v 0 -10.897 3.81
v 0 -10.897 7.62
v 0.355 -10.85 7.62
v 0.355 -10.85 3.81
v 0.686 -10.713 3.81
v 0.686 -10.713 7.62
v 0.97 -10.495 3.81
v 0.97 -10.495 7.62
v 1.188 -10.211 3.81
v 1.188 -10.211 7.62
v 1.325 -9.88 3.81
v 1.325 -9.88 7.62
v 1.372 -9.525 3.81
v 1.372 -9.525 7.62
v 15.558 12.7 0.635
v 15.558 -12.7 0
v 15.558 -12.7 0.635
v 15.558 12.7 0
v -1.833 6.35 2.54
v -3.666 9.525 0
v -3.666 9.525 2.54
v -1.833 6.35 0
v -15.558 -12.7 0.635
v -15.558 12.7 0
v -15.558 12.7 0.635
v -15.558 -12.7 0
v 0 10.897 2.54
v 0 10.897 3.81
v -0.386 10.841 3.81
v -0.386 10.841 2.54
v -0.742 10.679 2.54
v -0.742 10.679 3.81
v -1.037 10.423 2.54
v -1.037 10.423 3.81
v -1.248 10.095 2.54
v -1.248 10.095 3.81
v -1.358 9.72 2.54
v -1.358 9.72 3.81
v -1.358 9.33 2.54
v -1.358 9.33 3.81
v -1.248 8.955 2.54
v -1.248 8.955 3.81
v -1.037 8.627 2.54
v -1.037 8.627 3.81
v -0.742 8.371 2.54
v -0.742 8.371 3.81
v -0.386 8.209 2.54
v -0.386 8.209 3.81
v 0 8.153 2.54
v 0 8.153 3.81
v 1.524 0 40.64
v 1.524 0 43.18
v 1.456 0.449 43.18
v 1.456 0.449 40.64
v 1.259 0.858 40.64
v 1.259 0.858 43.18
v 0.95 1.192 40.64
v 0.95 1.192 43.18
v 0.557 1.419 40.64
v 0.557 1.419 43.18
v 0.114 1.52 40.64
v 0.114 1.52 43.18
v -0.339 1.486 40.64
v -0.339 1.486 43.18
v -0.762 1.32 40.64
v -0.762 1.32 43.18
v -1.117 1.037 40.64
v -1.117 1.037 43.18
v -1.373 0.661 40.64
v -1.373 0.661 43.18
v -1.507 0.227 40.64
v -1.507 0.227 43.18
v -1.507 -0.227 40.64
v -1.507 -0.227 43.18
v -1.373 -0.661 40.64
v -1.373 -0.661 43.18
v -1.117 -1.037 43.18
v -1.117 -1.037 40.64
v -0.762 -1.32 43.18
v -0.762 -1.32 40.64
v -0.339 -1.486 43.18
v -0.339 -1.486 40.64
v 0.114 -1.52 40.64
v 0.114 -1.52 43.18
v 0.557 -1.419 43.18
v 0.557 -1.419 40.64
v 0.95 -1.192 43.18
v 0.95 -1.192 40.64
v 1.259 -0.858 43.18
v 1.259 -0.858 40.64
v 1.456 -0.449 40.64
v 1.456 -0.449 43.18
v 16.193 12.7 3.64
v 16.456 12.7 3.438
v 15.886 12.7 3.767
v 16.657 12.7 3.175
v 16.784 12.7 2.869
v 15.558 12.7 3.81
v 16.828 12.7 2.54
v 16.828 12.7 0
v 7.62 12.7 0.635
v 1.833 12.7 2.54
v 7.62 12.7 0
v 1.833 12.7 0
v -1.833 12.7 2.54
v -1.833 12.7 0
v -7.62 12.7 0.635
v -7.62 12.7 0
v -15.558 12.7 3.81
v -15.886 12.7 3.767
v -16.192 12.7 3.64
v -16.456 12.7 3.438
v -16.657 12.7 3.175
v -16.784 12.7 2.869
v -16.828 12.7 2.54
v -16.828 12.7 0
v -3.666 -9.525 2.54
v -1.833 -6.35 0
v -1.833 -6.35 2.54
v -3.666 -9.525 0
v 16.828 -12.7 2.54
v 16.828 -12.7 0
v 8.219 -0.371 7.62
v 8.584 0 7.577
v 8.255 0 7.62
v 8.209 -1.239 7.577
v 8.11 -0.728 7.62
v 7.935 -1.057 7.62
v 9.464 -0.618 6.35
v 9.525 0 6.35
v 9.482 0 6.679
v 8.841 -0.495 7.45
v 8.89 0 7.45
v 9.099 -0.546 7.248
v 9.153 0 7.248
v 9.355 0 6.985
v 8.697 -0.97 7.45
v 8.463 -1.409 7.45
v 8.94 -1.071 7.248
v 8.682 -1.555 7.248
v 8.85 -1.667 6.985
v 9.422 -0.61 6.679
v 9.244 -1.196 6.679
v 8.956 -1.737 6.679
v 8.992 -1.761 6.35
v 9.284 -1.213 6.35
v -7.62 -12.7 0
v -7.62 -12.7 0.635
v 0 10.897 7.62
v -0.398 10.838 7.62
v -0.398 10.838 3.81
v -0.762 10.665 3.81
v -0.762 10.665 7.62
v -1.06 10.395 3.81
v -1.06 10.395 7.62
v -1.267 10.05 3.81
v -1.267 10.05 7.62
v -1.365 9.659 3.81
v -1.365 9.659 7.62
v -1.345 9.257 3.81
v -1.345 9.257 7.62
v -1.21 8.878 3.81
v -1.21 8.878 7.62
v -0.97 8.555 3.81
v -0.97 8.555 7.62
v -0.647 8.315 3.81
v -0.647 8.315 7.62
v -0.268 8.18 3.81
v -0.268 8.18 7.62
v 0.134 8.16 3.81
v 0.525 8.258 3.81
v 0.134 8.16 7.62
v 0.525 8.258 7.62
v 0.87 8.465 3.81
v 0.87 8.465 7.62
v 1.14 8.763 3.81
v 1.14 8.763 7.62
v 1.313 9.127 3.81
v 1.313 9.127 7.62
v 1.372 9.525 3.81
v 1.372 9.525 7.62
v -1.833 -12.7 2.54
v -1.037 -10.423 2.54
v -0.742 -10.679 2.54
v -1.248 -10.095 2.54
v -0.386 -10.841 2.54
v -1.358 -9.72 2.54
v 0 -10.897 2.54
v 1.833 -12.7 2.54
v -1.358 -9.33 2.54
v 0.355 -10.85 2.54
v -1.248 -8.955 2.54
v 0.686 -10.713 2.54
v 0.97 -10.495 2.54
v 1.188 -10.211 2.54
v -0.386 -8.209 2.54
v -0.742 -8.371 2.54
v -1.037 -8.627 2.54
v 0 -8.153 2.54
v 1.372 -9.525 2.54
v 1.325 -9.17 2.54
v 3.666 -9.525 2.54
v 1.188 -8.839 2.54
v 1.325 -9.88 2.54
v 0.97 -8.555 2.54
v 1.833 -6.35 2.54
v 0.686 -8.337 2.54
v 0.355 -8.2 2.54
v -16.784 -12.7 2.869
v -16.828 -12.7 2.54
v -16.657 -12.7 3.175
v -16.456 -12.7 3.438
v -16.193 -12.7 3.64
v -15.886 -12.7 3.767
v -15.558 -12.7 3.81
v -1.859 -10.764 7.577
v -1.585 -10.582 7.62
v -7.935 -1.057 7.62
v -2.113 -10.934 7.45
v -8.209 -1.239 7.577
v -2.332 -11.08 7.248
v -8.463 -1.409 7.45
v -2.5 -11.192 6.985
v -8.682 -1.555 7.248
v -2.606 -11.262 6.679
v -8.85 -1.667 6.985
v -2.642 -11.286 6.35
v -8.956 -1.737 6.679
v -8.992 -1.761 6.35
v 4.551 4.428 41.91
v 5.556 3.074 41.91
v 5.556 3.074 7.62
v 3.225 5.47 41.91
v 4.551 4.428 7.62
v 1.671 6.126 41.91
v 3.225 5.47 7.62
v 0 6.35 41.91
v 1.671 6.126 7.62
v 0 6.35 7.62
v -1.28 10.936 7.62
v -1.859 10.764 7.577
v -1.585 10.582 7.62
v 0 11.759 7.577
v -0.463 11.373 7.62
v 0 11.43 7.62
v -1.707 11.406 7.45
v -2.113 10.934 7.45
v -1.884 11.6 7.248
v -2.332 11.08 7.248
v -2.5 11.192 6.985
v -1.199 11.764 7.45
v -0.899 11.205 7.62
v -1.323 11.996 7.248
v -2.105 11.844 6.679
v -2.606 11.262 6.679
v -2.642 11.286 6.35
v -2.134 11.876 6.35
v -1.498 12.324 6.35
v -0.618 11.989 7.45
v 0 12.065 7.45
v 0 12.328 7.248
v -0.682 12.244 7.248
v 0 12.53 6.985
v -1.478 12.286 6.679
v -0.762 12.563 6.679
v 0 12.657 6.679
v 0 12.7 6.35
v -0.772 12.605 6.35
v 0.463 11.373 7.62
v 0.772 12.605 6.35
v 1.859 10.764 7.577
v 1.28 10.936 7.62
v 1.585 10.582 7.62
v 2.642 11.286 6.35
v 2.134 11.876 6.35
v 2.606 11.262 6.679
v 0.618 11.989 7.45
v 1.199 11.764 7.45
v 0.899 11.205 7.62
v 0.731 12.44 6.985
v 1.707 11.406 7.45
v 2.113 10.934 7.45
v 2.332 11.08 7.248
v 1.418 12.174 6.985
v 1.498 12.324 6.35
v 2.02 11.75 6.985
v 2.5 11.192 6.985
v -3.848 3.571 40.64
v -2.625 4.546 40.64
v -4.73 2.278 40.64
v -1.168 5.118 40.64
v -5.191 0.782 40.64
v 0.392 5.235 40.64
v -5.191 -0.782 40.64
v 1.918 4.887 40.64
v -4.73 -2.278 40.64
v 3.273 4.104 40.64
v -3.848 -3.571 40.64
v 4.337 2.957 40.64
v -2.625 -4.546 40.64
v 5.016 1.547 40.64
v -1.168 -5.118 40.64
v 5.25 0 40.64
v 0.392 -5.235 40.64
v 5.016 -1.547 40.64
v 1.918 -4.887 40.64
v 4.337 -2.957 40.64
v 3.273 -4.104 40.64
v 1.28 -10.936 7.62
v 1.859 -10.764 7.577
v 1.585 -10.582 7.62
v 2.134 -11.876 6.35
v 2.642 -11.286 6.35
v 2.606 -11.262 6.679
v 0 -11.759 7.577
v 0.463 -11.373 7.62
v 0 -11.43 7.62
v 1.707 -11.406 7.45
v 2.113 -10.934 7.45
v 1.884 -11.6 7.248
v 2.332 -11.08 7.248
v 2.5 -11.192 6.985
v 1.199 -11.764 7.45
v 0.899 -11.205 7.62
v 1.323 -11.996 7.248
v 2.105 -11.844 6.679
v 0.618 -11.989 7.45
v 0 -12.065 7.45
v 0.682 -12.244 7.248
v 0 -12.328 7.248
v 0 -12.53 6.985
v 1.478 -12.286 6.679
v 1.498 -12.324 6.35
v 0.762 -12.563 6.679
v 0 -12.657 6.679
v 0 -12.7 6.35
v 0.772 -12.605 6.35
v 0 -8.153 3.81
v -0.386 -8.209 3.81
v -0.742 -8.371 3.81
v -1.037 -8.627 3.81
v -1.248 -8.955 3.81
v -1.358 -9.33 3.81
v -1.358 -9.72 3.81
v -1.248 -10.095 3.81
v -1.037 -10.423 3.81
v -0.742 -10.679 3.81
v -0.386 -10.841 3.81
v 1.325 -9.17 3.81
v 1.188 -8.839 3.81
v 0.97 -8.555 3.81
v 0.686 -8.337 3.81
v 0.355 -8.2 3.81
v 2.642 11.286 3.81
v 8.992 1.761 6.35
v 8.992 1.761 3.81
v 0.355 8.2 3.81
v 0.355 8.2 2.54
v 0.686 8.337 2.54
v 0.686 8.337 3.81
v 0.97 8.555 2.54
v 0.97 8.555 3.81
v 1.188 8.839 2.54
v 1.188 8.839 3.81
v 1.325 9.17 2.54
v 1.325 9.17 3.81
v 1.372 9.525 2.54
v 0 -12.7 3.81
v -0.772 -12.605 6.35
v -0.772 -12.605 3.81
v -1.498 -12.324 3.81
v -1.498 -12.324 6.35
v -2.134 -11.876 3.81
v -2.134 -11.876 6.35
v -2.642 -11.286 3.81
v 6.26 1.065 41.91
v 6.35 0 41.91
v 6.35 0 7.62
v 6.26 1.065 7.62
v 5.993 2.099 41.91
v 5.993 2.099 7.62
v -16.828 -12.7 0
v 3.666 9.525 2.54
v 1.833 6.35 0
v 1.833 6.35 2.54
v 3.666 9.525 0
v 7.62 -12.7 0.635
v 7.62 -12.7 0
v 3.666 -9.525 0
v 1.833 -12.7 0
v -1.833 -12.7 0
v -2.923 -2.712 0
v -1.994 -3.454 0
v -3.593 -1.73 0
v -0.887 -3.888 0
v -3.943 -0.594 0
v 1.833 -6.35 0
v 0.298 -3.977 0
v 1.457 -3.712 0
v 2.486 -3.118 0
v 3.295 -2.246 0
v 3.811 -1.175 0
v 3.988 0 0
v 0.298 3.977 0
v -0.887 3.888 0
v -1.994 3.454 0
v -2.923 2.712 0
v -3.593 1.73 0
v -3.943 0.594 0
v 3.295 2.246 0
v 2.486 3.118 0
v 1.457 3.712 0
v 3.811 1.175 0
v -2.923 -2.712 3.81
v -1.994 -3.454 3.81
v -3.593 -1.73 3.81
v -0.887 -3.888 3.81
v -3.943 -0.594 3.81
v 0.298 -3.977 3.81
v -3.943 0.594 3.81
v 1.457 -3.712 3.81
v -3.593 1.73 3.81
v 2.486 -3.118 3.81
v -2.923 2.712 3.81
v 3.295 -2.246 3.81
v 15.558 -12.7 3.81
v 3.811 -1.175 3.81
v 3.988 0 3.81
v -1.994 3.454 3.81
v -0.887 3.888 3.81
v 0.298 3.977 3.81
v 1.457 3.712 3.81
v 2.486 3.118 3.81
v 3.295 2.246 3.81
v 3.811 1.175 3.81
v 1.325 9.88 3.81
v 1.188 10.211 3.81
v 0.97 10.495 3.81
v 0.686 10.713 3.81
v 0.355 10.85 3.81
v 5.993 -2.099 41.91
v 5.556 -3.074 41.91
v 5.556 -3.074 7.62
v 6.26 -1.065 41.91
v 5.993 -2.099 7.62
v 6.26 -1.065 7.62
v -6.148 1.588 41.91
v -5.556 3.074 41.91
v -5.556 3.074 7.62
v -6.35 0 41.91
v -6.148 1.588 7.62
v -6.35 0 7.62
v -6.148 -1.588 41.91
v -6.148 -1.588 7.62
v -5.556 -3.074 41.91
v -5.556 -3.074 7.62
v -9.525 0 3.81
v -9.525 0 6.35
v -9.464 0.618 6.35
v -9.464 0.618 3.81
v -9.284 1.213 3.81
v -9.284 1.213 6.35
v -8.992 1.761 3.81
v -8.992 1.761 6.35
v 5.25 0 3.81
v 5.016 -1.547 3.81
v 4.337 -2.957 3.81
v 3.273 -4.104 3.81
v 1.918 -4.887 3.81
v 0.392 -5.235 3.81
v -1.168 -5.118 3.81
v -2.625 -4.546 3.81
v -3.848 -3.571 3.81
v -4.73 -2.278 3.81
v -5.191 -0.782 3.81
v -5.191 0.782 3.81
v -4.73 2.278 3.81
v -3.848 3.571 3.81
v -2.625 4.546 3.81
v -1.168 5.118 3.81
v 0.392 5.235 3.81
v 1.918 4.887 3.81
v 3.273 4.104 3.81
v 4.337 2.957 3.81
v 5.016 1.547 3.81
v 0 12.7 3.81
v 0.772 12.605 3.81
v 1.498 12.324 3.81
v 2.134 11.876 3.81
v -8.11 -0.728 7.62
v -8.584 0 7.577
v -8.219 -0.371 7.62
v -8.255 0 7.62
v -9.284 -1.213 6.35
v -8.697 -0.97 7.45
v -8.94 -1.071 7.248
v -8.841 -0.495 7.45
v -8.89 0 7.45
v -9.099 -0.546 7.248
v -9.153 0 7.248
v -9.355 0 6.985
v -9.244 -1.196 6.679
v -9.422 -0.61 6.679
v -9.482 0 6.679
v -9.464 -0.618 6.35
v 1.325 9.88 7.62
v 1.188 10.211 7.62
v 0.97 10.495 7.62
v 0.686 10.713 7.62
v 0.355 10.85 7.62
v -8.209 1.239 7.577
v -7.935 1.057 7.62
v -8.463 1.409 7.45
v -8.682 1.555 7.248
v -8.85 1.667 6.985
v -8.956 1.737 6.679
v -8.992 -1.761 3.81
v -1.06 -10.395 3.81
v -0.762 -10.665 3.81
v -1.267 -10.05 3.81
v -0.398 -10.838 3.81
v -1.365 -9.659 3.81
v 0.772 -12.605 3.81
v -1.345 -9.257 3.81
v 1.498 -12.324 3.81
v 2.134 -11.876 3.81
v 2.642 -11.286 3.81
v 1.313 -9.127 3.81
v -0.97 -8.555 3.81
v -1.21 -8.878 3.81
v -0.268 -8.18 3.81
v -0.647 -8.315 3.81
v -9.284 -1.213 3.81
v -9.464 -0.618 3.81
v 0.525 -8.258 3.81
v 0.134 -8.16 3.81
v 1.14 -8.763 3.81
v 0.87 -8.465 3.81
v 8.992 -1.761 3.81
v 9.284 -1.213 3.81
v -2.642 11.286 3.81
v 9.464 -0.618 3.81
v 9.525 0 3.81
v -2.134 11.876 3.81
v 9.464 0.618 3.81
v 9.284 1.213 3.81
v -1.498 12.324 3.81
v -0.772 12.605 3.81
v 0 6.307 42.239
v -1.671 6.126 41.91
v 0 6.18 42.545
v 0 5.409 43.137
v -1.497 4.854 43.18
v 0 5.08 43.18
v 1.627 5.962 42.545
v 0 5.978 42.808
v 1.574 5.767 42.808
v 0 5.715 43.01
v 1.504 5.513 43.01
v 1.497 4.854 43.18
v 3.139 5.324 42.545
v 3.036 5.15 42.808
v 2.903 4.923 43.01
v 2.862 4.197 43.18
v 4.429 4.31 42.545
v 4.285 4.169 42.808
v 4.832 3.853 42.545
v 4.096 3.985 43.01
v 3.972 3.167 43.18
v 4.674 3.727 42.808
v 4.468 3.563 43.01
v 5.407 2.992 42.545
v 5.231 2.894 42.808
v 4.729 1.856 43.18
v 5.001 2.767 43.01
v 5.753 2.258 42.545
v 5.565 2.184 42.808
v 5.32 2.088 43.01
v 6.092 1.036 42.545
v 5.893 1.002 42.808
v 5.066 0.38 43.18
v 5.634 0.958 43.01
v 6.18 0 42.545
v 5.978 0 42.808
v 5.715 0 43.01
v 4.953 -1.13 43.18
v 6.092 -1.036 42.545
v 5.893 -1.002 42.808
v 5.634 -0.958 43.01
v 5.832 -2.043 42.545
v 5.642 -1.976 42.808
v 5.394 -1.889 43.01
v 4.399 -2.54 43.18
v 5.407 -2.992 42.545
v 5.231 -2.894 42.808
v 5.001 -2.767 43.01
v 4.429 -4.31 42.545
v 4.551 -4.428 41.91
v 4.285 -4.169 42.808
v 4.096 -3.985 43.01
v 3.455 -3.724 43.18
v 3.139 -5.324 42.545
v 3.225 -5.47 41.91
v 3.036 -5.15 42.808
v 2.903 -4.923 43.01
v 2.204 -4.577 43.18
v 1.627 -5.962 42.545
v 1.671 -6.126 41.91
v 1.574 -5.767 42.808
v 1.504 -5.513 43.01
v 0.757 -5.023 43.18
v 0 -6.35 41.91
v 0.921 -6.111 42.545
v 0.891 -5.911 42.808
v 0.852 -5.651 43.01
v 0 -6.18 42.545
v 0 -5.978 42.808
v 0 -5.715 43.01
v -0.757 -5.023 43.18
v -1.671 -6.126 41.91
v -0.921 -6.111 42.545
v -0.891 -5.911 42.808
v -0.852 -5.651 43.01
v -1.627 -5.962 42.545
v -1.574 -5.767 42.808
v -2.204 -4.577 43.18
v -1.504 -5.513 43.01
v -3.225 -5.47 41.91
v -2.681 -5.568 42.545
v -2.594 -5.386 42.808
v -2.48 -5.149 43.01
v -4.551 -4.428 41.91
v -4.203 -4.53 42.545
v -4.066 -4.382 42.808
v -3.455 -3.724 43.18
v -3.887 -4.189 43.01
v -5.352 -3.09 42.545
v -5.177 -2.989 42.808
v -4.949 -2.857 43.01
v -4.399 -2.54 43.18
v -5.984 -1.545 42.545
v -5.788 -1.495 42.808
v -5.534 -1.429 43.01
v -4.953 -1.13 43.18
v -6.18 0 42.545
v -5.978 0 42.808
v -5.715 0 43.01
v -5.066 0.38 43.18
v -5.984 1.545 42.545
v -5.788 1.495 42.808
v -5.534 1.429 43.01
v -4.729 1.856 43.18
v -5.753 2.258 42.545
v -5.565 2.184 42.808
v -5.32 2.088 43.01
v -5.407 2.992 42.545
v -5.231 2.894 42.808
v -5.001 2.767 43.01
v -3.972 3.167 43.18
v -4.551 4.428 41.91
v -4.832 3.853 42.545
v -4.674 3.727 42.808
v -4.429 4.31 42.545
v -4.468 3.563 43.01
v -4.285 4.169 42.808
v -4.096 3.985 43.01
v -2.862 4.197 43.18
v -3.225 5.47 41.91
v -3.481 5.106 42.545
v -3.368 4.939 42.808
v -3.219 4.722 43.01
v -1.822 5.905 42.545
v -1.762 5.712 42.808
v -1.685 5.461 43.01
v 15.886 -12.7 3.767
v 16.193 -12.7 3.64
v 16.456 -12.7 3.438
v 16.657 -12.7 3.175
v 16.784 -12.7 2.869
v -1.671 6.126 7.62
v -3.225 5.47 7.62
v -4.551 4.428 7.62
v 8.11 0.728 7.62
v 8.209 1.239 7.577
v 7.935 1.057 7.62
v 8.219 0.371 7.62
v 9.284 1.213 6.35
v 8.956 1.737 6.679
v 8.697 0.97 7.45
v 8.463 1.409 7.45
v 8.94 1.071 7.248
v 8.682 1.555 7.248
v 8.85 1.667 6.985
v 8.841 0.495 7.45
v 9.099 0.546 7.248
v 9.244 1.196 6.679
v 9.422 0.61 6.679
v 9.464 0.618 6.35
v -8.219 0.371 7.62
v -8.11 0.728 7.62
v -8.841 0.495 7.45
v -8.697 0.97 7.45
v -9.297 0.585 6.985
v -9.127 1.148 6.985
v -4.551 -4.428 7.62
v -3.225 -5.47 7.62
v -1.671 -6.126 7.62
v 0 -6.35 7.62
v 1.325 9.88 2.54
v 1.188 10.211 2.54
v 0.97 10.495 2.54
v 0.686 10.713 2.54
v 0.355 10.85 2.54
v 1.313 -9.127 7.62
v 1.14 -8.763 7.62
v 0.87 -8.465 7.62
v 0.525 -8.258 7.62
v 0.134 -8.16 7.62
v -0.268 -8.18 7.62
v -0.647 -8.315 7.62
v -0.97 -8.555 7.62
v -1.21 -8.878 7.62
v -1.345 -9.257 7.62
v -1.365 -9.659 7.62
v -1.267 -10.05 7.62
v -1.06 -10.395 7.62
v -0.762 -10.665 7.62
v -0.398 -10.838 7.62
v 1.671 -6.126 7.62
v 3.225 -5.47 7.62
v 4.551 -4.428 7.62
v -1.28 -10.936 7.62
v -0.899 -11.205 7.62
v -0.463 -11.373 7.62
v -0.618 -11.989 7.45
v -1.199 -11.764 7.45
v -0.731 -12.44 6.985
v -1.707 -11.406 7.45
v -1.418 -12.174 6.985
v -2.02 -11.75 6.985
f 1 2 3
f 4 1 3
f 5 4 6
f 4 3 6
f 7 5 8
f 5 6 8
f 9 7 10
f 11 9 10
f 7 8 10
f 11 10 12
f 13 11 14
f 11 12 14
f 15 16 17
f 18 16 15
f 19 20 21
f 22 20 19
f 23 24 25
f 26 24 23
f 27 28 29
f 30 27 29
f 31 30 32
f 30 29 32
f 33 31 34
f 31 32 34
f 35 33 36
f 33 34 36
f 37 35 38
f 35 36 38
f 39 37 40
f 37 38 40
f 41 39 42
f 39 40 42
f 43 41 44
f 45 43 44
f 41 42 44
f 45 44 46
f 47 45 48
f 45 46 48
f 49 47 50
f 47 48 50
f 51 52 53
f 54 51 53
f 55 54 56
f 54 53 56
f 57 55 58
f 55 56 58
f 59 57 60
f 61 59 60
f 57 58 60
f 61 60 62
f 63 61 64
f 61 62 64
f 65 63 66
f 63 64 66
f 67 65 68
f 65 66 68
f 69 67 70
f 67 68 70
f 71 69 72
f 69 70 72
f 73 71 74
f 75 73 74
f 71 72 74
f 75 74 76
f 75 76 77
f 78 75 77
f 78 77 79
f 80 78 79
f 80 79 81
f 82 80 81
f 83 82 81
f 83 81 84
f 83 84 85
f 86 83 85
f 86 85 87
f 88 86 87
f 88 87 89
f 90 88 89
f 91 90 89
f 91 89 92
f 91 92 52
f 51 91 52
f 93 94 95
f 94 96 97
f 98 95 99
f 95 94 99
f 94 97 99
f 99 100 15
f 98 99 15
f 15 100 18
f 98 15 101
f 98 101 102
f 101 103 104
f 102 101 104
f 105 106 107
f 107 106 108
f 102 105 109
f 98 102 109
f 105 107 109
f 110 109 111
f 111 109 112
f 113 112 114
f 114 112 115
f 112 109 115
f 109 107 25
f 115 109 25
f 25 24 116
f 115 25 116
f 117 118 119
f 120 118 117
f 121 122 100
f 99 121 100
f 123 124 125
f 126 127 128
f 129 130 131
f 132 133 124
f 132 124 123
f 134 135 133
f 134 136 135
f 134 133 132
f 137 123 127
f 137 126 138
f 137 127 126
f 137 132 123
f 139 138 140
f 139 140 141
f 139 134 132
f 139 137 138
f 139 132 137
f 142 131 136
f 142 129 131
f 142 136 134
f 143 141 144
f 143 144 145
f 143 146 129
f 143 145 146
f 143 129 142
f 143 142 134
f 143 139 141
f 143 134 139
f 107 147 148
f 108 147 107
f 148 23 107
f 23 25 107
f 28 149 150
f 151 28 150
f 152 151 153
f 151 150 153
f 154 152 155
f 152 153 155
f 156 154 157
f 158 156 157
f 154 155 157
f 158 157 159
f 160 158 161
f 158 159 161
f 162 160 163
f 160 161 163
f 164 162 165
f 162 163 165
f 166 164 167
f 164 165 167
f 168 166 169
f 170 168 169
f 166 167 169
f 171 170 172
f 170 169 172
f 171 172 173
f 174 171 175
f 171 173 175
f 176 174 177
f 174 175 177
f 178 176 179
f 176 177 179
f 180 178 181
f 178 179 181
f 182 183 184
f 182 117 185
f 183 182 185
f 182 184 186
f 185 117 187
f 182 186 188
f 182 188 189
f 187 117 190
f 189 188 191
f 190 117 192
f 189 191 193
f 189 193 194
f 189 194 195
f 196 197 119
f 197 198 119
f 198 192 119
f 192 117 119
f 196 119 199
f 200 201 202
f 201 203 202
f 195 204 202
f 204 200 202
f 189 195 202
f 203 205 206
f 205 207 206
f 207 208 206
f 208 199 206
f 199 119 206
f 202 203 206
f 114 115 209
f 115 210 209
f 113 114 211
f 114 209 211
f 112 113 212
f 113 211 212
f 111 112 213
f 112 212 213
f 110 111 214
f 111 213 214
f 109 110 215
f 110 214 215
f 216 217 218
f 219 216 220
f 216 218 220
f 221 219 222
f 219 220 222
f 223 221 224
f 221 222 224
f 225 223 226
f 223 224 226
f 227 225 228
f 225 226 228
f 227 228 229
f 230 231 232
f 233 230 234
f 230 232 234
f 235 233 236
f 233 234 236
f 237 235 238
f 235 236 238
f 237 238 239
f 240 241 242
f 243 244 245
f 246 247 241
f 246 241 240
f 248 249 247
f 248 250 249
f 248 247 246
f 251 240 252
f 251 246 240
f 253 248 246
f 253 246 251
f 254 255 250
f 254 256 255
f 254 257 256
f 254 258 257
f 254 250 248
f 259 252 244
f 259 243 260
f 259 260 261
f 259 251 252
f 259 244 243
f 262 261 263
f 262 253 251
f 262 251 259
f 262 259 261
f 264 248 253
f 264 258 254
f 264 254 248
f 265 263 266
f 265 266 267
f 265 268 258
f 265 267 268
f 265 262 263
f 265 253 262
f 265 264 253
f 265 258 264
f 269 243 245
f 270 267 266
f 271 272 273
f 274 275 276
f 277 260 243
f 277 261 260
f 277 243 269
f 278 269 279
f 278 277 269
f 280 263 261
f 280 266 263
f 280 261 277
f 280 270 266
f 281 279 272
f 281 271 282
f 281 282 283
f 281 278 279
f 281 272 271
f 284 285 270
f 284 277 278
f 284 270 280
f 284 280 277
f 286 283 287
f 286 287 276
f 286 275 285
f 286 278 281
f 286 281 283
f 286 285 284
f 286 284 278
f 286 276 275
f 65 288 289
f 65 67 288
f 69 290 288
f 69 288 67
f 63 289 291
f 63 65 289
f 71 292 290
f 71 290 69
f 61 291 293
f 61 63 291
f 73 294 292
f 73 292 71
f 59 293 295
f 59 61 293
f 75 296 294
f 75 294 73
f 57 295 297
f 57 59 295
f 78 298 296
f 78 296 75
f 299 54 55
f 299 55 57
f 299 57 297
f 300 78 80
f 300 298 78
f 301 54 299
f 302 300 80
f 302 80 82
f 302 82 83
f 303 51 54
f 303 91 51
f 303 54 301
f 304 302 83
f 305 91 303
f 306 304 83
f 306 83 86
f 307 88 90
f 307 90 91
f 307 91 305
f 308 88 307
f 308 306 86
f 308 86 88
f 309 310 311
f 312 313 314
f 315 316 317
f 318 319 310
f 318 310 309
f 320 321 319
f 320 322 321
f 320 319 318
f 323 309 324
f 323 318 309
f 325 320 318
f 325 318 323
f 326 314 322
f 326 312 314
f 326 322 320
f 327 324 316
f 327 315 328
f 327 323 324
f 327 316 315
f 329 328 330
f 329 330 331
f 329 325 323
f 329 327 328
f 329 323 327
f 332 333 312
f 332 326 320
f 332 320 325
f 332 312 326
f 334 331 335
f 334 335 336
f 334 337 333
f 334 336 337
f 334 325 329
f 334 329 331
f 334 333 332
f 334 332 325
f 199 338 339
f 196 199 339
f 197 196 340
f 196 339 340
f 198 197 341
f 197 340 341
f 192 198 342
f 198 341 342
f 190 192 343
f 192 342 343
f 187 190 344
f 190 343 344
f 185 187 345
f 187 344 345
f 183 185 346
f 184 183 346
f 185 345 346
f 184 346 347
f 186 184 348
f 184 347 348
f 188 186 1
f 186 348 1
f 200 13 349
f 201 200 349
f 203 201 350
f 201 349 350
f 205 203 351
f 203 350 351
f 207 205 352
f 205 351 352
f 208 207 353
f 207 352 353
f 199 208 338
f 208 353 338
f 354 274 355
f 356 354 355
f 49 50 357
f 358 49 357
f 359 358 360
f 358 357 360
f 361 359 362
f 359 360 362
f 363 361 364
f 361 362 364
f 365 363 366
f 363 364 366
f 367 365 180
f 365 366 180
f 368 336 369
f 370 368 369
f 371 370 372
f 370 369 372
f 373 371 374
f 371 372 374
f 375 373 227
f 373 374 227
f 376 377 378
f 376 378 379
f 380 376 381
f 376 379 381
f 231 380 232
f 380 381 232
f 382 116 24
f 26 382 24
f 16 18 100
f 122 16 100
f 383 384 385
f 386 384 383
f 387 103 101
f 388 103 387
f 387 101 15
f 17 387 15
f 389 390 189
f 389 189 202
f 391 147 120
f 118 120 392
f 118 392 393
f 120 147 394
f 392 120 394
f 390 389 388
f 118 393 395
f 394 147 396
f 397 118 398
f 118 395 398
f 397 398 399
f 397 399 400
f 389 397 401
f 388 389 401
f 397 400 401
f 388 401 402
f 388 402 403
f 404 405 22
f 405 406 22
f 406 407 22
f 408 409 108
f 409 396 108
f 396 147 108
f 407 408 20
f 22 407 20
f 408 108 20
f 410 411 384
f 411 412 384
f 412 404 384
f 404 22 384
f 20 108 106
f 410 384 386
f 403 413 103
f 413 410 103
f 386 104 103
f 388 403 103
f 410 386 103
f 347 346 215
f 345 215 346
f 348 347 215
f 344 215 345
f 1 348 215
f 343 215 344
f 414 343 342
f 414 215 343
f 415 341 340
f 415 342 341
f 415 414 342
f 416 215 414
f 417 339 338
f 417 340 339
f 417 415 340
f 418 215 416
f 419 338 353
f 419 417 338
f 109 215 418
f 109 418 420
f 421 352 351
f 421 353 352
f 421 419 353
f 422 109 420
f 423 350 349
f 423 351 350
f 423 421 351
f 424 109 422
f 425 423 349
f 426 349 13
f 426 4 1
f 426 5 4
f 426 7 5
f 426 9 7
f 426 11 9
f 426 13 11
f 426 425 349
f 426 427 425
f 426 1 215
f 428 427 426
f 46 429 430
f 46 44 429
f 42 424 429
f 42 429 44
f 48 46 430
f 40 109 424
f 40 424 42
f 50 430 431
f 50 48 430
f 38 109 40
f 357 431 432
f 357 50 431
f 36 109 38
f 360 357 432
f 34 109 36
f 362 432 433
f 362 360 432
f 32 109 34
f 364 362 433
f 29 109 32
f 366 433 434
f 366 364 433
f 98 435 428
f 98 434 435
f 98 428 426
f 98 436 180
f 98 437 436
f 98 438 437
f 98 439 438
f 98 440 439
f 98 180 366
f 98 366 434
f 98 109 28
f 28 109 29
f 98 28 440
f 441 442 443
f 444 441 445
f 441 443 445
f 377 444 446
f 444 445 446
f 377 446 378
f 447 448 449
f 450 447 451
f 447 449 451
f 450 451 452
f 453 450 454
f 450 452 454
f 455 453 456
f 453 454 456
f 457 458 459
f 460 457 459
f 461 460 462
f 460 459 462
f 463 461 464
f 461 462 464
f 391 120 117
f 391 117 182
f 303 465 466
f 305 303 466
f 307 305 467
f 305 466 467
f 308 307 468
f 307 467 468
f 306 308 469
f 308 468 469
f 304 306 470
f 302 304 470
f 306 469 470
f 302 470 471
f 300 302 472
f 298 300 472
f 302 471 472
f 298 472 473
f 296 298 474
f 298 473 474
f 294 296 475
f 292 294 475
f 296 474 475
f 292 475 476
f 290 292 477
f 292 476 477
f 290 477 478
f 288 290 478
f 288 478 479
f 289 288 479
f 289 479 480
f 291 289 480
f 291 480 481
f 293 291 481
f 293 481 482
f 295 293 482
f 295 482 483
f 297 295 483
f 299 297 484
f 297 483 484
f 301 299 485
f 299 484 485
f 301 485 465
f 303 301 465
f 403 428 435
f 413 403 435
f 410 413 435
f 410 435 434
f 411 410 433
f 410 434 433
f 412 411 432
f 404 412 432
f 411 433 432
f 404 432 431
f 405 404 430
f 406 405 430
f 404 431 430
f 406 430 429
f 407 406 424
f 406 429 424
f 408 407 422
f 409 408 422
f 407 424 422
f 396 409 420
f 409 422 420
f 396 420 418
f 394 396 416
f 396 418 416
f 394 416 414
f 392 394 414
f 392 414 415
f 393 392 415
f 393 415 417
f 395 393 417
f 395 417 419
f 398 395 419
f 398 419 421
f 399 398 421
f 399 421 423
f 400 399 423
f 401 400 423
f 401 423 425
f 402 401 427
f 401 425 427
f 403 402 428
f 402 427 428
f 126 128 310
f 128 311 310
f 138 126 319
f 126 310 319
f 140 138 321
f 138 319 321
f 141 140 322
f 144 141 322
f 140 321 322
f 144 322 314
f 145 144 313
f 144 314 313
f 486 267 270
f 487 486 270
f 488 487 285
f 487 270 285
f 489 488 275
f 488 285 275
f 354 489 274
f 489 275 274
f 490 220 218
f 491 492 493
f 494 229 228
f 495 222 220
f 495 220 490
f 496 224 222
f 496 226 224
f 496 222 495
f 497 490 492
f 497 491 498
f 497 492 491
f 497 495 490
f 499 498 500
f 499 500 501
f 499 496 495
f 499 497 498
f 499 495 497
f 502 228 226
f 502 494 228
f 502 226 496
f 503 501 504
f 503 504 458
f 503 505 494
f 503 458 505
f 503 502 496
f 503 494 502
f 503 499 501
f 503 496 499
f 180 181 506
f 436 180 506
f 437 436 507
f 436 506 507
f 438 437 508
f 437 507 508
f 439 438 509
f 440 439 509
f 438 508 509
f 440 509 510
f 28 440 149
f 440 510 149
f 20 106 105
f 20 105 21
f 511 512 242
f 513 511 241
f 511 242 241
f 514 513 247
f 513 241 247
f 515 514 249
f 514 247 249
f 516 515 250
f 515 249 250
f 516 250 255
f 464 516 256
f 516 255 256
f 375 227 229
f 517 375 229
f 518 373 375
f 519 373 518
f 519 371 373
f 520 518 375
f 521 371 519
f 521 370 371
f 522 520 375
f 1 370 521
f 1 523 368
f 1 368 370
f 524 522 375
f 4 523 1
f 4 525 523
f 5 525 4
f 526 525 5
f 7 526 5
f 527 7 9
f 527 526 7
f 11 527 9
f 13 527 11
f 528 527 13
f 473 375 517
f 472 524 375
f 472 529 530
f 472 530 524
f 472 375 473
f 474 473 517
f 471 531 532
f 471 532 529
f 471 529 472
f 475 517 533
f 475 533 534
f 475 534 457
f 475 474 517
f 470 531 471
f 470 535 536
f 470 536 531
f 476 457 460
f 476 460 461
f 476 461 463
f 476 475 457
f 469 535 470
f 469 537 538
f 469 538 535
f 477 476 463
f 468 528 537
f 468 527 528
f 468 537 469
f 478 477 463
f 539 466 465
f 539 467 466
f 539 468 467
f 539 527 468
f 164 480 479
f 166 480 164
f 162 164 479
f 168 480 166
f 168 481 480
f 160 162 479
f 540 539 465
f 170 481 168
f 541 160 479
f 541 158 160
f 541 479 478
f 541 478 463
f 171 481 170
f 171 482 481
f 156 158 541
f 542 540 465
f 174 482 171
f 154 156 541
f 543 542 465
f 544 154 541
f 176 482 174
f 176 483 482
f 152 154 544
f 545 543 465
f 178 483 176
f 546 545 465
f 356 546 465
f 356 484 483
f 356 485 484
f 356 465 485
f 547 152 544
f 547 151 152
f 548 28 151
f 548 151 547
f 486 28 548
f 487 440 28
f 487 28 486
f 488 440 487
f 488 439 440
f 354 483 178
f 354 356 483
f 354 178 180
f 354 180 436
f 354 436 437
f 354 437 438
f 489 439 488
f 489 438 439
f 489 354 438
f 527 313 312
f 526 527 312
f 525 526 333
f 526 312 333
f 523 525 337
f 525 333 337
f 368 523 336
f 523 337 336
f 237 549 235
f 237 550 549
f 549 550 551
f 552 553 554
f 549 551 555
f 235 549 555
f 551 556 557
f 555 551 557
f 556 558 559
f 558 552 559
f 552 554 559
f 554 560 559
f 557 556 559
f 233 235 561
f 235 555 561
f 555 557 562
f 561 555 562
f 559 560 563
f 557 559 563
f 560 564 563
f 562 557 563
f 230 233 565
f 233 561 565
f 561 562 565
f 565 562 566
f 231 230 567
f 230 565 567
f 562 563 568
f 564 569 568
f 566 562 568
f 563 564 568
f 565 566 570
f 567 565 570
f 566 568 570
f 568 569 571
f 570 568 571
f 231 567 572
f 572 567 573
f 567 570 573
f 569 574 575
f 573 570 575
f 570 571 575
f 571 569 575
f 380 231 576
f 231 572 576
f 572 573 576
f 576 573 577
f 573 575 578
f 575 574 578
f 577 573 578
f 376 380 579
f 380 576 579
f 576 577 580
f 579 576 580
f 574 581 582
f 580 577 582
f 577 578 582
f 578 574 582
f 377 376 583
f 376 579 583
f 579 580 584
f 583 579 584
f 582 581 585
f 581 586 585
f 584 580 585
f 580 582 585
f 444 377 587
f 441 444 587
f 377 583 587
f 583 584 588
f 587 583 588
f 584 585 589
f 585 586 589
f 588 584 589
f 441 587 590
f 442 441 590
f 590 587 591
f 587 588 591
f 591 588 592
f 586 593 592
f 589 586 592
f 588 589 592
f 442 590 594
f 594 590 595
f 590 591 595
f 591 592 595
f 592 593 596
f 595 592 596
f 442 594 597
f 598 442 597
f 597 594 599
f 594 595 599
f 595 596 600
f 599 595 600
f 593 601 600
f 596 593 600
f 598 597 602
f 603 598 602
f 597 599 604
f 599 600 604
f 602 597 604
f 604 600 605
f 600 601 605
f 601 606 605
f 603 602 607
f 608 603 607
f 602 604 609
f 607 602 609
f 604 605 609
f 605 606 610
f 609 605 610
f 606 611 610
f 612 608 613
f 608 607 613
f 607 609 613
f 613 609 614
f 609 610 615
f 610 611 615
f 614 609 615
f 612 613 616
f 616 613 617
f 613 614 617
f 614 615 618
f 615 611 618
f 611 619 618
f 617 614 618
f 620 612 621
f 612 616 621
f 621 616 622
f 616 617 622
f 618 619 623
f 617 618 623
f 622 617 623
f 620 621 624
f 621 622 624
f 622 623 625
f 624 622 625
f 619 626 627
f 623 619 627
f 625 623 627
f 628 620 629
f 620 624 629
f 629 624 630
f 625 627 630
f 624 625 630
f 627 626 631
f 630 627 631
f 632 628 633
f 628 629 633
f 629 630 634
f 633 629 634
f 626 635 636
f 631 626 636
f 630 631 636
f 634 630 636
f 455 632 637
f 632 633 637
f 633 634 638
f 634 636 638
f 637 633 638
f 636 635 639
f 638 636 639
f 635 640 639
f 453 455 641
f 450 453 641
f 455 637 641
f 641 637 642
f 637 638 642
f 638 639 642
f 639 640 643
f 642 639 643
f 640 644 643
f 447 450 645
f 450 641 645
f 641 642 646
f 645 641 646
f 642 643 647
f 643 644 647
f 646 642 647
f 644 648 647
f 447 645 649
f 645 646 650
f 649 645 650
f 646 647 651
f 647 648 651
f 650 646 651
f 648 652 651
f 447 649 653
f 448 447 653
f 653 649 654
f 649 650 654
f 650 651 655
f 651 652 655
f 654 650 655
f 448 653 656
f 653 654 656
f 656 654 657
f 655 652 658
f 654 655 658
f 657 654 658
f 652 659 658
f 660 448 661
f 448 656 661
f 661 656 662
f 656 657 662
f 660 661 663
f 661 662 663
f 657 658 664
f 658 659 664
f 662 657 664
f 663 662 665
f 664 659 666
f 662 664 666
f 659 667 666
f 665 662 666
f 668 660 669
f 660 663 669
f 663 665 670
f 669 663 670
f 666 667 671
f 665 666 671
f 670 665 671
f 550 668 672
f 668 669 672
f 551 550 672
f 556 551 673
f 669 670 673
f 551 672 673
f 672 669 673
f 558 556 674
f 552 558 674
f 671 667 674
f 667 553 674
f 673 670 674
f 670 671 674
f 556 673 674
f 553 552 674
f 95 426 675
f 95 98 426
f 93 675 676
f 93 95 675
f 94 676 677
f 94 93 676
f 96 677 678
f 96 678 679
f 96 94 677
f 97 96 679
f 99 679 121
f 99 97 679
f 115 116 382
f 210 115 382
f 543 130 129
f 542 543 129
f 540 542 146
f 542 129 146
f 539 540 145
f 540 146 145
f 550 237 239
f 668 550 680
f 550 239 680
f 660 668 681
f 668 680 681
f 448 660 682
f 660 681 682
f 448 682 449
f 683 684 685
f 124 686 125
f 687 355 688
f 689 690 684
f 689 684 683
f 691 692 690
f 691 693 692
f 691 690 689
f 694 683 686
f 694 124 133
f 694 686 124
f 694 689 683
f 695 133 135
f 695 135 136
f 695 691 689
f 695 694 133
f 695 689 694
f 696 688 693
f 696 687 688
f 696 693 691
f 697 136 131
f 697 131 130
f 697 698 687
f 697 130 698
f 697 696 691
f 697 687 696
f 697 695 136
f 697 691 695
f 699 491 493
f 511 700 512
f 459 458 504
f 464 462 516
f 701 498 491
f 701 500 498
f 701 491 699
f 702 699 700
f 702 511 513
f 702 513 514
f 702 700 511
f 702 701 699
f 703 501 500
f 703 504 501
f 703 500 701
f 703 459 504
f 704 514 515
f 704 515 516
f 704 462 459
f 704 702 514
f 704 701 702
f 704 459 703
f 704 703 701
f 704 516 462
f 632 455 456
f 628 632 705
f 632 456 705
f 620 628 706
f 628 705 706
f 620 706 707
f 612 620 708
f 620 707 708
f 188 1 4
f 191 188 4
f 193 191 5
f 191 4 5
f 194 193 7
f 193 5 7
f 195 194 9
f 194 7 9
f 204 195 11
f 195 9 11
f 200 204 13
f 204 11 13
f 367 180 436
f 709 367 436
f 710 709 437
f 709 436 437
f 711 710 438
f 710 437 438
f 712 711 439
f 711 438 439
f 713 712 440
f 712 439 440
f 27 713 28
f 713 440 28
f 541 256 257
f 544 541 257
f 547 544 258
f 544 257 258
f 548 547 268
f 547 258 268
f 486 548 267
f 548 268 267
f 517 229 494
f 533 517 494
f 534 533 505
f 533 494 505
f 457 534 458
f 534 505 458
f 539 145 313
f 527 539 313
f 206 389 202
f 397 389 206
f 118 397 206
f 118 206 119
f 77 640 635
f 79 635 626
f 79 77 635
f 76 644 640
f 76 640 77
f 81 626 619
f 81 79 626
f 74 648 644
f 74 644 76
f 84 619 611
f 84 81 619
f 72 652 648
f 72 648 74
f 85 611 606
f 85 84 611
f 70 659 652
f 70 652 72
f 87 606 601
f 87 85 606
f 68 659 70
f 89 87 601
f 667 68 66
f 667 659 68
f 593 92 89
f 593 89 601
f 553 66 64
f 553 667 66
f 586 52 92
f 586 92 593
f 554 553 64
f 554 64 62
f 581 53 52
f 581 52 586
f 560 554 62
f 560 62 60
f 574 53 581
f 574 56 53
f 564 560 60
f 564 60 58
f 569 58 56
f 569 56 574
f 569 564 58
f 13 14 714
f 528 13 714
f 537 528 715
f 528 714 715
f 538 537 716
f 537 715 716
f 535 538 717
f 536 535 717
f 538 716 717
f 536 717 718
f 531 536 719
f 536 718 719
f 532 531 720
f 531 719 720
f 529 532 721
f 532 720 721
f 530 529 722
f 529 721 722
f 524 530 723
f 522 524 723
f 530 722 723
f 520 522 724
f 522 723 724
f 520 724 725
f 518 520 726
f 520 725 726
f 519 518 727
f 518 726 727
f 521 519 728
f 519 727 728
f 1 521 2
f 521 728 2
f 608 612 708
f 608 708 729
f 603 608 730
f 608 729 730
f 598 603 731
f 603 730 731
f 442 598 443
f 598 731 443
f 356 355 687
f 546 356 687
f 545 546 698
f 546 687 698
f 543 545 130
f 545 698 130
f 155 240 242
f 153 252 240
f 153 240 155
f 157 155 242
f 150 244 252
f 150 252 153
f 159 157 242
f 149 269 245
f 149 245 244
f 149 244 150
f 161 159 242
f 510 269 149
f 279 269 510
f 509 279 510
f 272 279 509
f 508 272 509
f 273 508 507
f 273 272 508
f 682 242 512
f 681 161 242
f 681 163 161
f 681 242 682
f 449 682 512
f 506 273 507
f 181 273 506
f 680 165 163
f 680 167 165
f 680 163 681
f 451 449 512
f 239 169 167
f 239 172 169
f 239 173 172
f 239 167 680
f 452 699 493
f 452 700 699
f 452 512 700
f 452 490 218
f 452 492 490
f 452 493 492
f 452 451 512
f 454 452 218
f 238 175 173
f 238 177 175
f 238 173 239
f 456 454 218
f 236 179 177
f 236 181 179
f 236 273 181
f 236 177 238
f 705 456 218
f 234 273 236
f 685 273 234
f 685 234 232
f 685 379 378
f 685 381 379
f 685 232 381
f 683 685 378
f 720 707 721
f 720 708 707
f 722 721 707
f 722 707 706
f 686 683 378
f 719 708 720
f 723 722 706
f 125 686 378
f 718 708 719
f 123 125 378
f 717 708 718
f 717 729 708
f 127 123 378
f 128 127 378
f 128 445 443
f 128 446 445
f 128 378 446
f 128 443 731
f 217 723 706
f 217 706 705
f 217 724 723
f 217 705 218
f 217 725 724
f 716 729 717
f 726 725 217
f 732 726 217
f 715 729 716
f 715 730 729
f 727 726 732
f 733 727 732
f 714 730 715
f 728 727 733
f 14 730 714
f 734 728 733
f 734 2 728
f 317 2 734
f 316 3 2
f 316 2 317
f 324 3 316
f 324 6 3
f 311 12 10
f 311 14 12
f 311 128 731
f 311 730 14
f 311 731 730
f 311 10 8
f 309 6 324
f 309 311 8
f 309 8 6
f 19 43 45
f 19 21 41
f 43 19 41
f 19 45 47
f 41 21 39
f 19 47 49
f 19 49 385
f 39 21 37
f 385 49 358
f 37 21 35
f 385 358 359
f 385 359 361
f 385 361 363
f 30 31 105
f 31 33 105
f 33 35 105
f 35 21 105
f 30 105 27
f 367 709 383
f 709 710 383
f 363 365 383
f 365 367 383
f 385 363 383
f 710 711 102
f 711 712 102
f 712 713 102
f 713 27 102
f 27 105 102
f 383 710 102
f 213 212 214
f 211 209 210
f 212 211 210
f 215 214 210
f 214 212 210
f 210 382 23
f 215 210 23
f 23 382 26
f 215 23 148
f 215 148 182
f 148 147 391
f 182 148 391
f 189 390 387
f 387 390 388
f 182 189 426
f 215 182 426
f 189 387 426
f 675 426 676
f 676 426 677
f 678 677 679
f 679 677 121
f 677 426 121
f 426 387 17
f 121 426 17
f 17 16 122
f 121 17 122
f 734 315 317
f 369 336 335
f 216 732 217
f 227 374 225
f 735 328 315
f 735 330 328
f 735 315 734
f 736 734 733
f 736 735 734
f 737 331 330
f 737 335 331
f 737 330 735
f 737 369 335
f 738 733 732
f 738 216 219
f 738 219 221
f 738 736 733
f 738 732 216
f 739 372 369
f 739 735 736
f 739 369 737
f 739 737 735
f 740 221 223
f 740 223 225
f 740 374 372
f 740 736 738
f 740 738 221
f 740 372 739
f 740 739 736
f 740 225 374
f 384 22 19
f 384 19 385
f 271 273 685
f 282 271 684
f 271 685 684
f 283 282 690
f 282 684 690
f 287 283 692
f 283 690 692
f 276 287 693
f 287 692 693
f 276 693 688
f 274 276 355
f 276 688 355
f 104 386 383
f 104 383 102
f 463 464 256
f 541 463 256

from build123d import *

# Parameters (mm, degrees)
F0_W      = 7.9375
F0_H      = 12.7
F1_DEPTH  = 3.81
F2_DEPTH  = 0.635
F3_R      = 3.9878
F3_R_2    = 2.54
F4_DEPTH  = 3.81
F6_DEPTH  = 3.81
F8_DEPTH  = 2.54
F9_W      = 12.7
F9_H      = 3.81
F10_DEPTH = 9.525
F12_DEPTH = 3.81
F14_DEPTH = 3.81
F16_DEPTH = 35.56
F17_R     = 1.27
F17_2_R   = 1.27
F18_R     = 5.2496341023
F19_DEPTH = 36.83
F20_R     = 1.524
F21_DEPTH = 25.4


# Not quite as in the source:
# - a fillet or chamfer that OpenCascade refuses, or shapes differently, is made with other operations: its cross-section is extruded or revolved along the edge and cut away or added


with BuildPart() as f1:
    # F0 (on Top) → F1 (new body)
    with BuildSketch(Plane.XY):
        Polygon((-15.5575, -12.7), (-15.5575, 0), (-15.5575, 12.7), (-16.8275, 12.7), (-16.8275, -12.7), align=None)
        with Locations((-11.58875, 6.35)):
            Rectangle(F0_W, F0_H)
        with Locations((-11.58875, -6.35)):
            Rectangle(F0_W, F0_H)
        with BuildLine():
            ThreePointArc((0, -2.54), (-1.7960512242, -1.7960512242), (-2.54, 0))
            Line((-2.54, 0), (-7.62, 0))
            Line((-7.62, 0), (-7.62, -12.7))
            Line((-7.62, -12.7), (0, -12.7))
            Line((0, -12.7), (0, -2.54))
        make_face()
        with BuildLine():
            ThreePointArc((-2.54, 0), (0, 2.54), (2.54, 0))
            Line((2.54, 0), (7.62, 0))
            Line((7.62, 0), (7.62, 12.7))
            Line((7.62, 12.7), (-7.62, 12.7))
            Line((-7.62, 12.7), (-7.62, 0))
            Line((-7.62, 0), (-2.54, 0))
        make_face()
        with BuildLine():
            Line((7.62, 0), (2.54, 0))
            ThreePointArc((2.54, 0), (1.7960512242, -1.7960512242), (0, -2.54))
            Line((0, -2.54), (0, -12.7))
            Line((0, -12.7), (7.62, -12.7))
            Line((7.62, -12.7), (7.62, 0))
        make_face()
        with Locations((11.58875, -6.35)):
            Rectangle(F0_W, F0_H)
        with Locations((11.58875, 6.35)):
            Rectangle(F0_W, F0_H)
        Polygon((15.5575, 12.7), (15.5575, 0), (15.5575, -12.7), (16.8275, -12.7), (16.8275, 12.7), align=None)
    extrude(amount=F1_DEPTH)

    # F0 (on Top) → F2 (cut)
    with BuildSketch(Plane.XY):
        with Locations((-11.58875, -6.35)):
            Rectangle(F0_W, F0_H)
        with Locations((-11.58875, 6.35)):
            Rectangle(F0_W, F0_H)
        with Locations((11.58875, 6.35)):
            Rectangle(F0_W, F0_H)
        with Locations((11.58875, -6.35)):
            Rectangle(F0_W, F0_H)
    extrude(amount=F2_DEPTH, mode=Mode.SUBTRACT)

    # F3 (on face) → F4 (cut, through all)
    with BuildSketch(Plane.XY.offset(3.81)):
        Circle(F3_R)
        Circle(F3_R_2, mode=Mode.SUBTRACT)
    extrude(amount=-F4_DEPTH, mode=Mode.SUBTRACT)

    # F5 (on face) → F6 (cut, through all)
    with BuildSketch(Plane.XY.offset(3.81)):
        with BuildLine():
            ThreePointArc((0, 10.8966), (-1.3716, 9.525), (0, 8.1534))
            Line((0, 8.1534), (0, 9.525))
            Line((0, 9.525), (0, 10.8966))
        make_face()
        with BuildLine():
            Line((0, 9.525), (0, 8.1534))
            ThreePointArc((0, 8.1534), (0.9698676611, 8.5551323389), (1.3716, 9.525))
            ThreePointArc((1.3716, 9.525), (0.9698676611, 10.4948676611), (0, 10.8966))
            Line((0, 10.8966), (0, 9.525))
        make_face()
        with BuildLine():
            ThreePointArc((1.3716, -9.525), (0.9698676611, -8.5551323389), (0, -8.1534))
            Line((0, -8.1534), (0, -9.525))
            Line((0, -9.525), (0, -10.8966))
            ThreePointArc((0, -10.8966), (0.9698676611, -10.4948676611), (1.3716, -9.525))
        make_face()
        with BuildLine():
            Line((0, -9.525), (0, -8.1534))
            ThreePointArc((0, -8.1534), (-1.3716, -9.525), (0, -10.8966))
            Line((0, -10.8966), (0, -9.525))
        make_face()
    extrude(amount=-F6_DEPTH, mode=Mode.SUBTRACT)

    # F7 (on face) → F8 (cut)
    with BuildSketch(Plane.XY):
        Polygon((1.8330871047, -6.35), (0, -6.35), (0, -9.525), (0, -12.7), (1.8330871047, -12.7), (3.6661742094, -9.525), align=None)
        Polygon((0, -12.7), (0, -9.525), (-3.6661742094, -9.525), (-1.8330871047, -12.7), align=None)
        Polygon((0, -9.525), (0, -6.35), (-1.8330871047, -6.35), (-3.6661742094, -9.525), align=None)
        Polygon((0, 9.525), (0, 6.35), (1.8330871047, 6.35), (3.6661742094, 9.525), (1.8330871047, 12.7), (-1.8330871047, 12.7), (-3.6661742094, 9.525), align=None)
        Polygon((-1.8330871047, 6.35), (0, 6.35), (0, 9.525), (-3.6661742094, 9.525), align=None)
    extrude(amount=F8_DEPTH, mode=Mode.SUBTRACT)

    # F17
    f17_edges = [f1.edges().sort_by_distance(p)[0] for p in [
        (16.8275, 0, 3.81),
        (-16.8275, 0, 3.81),
    ]]
    fillet(f17_edges, radius=F17_R)


with BuildPart() as f10:
    # F9 (on Right) → F10 (new body, symmetric)
    with BuildSketch(Plane.YZ):
        with Locations((6.35, 5.715)):
            Rectangle(F9_W, F9_H)
        with Locations((-6.35, 5.715)):
            Rectangle(F9_W, F9_H)
    extrude(amount=F10_DEPTH, both=True)

    # F11 (on face) → F12 (cut)
    with BuildSketch(Plane.XY.offset(7.62)):
        with BuildLine():
            ThreePointArc((1.3716, 9.525), (0.9698676611, 10.4948676611), (0, 10.8966))
            ThreePointArc((0, 10.8966), (-0.9698676611, 8.5551323389), (1.3716, 9.525))
        make_face()
        with BuildLine():
            ThreePointArc((1.3716, -9.525), (-0.9698676611, -8.5551323389), (0, -10.8966))
            ThreePointArc((0, -10.8966), (0.9698676611, -10.4948676611), (1.3716, -9.525))
        make_face()
    extrude(amount=-F12_DEPTH, mode=Mode.SUBTRACT)

    # F13 (on face) → F14 (cut)
    with BuildSketch(Plane.XY.offset(7.62)):
        with BuildLine():
            Line((-8.9917596845, 1.761173123), (-2.6417596845, 11.286173123))
            ThreePointArc((-2.6417596845, 11.286173123), (-1.4981489136, 12.3243168511), (0, 12.7))
            Line((0, 12.7), (-9.525, 12.7))
            Line((-9.525, 12.7), (-9.525, 0))
            ThreePointArc((-9.525, 0), (-9.3887671841, 0.9200646721), (-8.9917596845, 1.761173123))
        make_face()
        with BuildLine():
            ThreePointArc((0, 12.7), (1.4981489136, 12.3243168511), (2.6417596845, 11.286173123))
            Line((2.6417596845, 11.286173123), (8.9917596845, 1.761173123))
            ThreePointArc((8.9917596845, 1.761173123), (9.3887671841, 0.9200646721), (9.525, 0))
            Line((9.525, 0), (9.525, 12.7))
            Line((9.525, 12.7), (0, 12.7))
        make_face()
        with BuildLine():
            ThreePointArc((-8.9917596845, -1.761173123), (-9.3887671841, -0.9200646721), (-9.525, 0))
            Line((-9.525, 0), (-9.525, -12.7))
            Line((-9.525, -12.7), (-2.72e-08, -12.7))
            ThreePointArc((-2.72e-08, -12.7), (-1.4981489256, -12.3243168447), (-2.6417596845, -11.286173123))
            Line((-2.6417596845, -11.286173123), (-8.9917596845, -1.761173123))
        make_face()
        with BuildLine():
            Line((9.525, -12.7), (9.525, 0))
            ThreePointArc((9.525, 0), (9.3887671841, -0.9200646721), (8.9917596845, -1.761173123))
            Line((8.9917596845, -1.761173123), (2.6417596845, -11.286173123))
            ThreePointArc((2.6417596845, -11.286173123), (1.4981489016, -12.3243168575), (-2.72e-08, -12.7))
            Line((-2.72e-08, -12.7), (9.525, -12.7))
        make_face()
    extrude(amount=-F14_DEPTH, mode=Mode.SUBTRACT)

    # F15 (on face) → F16 (join)
    with BuildSketch(Plane.XY.offset(7.62)):
        with BuildLine():
            ThreePointArc((-3.175, 0), (-3.8399421072, 1.9442824833), (-5.55625, 3.0741805311))
            ThreePointArc((-5.55625, 3.0741805311), (-6.35, 0), (-5.55625, -3.0741805311))
            ThreePointArc((-5.55625, -3.0741805311), (-3.8399421072, -1.9442824833), (-3.175, 0))
        make_face()
        with BuildLine():
            Line((0, 0), (0, 6.35))
            ThreePointArc((-1.01e-08, 6.35), (-3.2250157894, 5.4700798128), (-5.55625, 3.0741805311))
            ThreePointArc((-5.55625, 3.0741805311), (-3.8399421072, 1.9442824833), (-3.175, 0))
            ThreePointArc((-3.175, 0), (-3.8399421072, -1.9442824833), (-5.55625, -3.0741805311))
            ThreePointArc((-5.55625, -3.0741805311), (-3.2250157851, -5.4700798153), (0, -6.35))
            Line((0, -6.35), (0, 0))
        make_face()
        with BuildLine():
            ThreePointArc((5.55625, -3.0741805311), (3.175, 0), (5.55625, 3.0741805311))
            ThreePointArc((5.55625, 3.0741805311), (3.2250157807, 5.4700798179), (-1.01e-08, 6.35))
            Line((0, 6.35), (0, 0))
            Line((0, 0), (0, -6.35))
            ThreePointArc((0, -6.35), (3.2250157851, -5.4700798153), (5.55625, -3.0741805311))
        make_face()
        with BuildLine():
            ThreePointArc((5.55625, -3.0741805311), (6.1483610621, -1.5875), (6.35, 0))
            ThreePointArc((6.35, 0), (6.1483610621, 1.5875), (5.55625, 3.0741805311))
            ThreePointArc((5.55625, 3.0741805311), (3.175, 0), (5.55625, -3.0741805311))
        make_face()
    extrude(amount=F16_DEPTH)

    # F17#2
    f17_2_edges = [f10.edges().sort_by_distance(p)[0] for p in [
        (5.81676, -6.523673, 7.62),
    ]]
    fillet(f17_2_edges, radius=F17_2_R)

    # F18 (on face) → F19 (cut)
    with BuildSketch(Plane(origin=(0, 0, 3.81), x_dir=(1, 0, 0), z_dir=(0, 0, -1))):
        Circle(F18_R)
    extrude(amount=-F19_DEPTH, mode=Mode.SUBTRACT)

    # F20 (on face) → F21 (cut)
    with BuildSketch(Plane.XY.offset(43.18)):
        Circle(F20_R)
    extrude(amount=-F21_DEPTH, mode=Mode.SUBTRACT)

    # F22: fillet of radius 1.27 on 1 edges, made by hand

    # F22_s1 → F22_t2 (revolve, cut)
    with BuildSketch(Plane.YZ):
        with BuildLine():
            ThreePointArc((6.35, 41.91), (5.9780256121, 42.8080256121), (5.08, 43.18))
            Line((5.08, 43.18), (6.35, 43.18))
            Line((6.35, 43.18), (6.35, 41.91))
        make_face()
    revolve(axis=Axis((0, 0, 43.18), (0, 0, -1)), mode=Mode.SUBTRACT)


solid = Compound([f1.part, f10.part])
